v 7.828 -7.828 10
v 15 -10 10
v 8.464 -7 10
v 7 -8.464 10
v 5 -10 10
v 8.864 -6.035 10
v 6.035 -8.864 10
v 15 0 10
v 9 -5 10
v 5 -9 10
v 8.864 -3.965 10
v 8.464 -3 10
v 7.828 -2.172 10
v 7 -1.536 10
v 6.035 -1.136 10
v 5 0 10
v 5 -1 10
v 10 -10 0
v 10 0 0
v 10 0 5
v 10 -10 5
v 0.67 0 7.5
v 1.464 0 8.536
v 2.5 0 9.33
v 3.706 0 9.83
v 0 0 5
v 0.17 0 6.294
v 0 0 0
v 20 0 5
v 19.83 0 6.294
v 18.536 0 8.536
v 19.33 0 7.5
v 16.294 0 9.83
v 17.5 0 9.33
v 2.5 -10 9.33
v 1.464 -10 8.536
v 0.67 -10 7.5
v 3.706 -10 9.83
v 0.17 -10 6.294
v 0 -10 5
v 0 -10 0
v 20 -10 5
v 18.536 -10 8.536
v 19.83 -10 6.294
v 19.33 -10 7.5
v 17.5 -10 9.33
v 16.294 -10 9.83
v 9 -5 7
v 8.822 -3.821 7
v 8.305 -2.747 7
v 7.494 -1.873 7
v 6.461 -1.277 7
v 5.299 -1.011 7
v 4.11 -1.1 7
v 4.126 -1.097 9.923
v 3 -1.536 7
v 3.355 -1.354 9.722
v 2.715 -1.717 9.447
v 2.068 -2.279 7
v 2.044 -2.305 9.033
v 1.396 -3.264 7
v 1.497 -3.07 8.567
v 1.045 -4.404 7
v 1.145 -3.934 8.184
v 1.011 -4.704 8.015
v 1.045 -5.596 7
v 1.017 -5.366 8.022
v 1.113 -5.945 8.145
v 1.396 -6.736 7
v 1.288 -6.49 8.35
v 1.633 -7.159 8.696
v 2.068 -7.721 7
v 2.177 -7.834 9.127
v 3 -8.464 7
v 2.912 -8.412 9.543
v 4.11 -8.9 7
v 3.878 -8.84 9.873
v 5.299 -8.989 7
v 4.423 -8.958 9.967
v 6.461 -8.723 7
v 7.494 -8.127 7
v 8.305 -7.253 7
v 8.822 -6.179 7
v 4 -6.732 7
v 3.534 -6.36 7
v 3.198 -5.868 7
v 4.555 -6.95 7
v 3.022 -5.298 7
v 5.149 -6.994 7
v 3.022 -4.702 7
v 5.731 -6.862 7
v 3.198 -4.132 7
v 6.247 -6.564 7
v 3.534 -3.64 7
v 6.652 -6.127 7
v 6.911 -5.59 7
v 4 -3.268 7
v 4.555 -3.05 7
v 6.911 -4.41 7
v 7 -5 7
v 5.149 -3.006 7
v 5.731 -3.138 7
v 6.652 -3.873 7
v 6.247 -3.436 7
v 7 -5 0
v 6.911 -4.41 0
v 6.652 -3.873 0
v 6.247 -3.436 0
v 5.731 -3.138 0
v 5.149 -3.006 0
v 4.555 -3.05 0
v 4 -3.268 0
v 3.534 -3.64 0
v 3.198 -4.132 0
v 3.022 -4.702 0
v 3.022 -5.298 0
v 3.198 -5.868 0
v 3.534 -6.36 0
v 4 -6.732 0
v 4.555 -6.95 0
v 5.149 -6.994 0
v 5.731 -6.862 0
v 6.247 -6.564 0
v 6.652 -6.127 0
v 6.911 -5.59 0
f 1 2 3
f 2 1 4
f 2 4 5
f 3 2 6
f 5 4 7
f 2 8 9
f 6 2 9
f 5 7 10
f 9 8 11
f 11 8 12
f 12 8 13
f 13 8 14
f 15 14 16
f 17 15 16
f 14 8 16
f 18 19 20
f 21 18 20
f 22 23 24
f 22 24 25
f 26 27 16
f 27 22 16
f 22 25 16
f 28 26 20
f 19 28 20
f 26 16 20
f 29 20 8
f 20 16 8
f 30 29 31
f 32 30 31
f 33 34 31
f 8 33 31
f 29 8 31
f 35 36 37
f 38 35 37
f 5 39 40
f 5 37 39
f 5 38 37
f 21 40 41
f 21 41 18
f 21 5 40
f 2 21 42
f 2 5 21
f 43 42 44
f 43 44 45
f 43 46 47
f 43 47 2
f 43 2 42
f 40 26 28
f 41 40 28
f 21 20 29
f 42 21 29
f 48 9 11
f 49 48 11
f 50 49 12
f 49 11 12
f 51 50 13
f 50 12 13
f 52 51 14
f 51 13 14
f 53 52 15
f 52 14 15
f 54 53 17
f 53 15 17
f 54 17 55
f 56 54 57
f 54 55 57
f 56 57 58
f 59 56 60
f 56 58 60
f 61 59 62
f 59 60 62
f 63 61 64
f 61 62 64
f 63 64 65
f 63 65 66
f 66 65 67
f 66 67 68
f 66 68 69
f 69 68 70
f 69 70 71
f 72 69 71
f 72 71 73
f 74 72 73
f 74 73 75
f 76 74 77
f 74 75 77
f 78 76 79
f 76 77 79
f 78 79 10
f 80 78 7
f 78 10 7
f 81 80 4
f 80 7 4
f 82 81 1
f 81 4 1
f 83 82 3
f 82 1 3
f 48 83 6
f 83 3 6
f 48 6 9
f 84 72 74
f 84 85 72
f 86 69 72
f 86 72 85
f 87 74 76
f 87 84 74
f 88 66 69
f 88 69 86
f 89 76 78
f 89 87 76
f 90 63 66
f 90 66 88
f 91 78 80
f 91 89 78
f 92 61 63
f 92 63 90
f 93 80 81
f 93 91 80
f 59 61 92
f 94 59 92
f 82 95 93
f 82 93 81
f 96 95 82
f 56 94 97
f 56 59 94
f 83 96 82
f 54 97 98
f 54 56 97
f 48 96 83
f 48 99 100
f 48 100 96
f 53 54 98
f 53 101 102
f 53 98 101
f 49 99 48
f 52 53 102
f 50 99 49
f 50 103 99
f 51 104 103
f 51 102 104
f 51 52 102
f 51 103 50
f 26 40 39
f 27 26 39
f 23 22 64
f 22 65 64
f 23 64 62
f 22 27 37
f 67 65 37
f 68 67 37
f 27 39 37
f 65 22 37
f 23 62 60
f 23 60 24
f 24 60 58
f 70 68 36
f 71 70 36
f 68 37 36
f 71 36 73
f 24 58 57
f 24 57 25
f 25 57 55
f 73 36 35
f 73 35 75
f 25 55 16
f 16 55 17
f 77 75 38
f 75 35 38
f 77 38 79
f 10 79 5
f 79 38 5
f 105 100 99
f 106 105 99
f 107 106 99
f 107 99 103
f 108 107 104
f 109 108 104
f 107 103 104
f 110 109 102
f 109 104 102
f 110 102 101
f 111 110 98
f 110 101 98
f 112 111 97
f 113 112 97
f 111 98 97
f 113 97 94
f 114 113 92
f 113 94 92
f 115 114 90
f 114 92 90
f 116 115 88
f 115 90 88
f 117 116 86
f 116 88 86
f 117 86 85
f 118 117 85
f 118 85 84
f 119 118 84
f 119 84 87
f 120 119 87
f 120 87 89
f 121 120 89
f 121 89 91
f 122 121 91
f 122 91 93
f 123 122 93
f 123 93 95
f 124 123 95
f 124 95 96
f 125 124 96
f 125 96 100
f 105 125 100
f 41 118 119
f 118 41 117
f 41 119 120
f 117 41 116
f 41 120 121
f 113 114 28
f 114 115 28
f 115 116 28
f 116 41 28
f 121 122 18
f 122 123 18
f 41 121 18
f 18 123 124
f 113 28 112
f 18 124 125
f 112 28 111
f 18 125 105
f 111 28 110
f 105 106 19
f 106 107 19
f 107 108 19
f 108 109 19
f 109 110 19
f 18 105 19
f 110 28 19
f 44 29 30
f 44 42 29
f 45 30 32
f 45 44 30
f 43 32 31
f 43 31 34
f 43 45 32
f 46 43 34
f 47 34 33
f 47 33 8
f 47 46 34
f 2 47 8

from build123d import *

# Parameters (mm, degrees)
F1_DEPTH = 10
F2_R     = 4.99999
F3_R     = 2
F4_DEPTH = 25
F5_R     = 4
F6_DEPTH = 3


# Not quite as in the source:
# - a fillet or chamfer is up to 0.001 mm smaller than in the source, because OpenCascade refuses the exact size


with BuildPart() as f1:
    # F0 (on Front) → F1 (new body)
    with BuildSketch(Plane.XZ):
        Polygon((0, 10), (0, 0), (10, 0), (10, 5), (20, 5), (20, 10), align=None)
    extrude(amount=F1_DEPTH)

    # F2 (radius 5 in the source; OpenCascade refuses exactly that, so slightly less here)
    f2_edges = [f1.edges().sort_by_distance(p)[0] for p in [
        (20, -5, 10),
        (0, -5, 10),
    ]]
    fillet(f2_edges, radius=F2_R)

    # F3 (on face) → F4 (cut)
    with BuildSketch(Plane.XY.offset(10)):
        with Locations((5, -5)):
            Circle(F3_R)
    extrude(amount=-F4_DEPTH, mode=Mode.SUBTRACT)

    # F5 (on face) → F6 (cut)
    with BuildSketch(Plane.XY.offset(10)):
        with Locations((5, -5)):
            Circle(F5_R)
    extrude(amount=-F6_DEPTH, mode=Mode.SUBTRACT)


solid = f1.part
